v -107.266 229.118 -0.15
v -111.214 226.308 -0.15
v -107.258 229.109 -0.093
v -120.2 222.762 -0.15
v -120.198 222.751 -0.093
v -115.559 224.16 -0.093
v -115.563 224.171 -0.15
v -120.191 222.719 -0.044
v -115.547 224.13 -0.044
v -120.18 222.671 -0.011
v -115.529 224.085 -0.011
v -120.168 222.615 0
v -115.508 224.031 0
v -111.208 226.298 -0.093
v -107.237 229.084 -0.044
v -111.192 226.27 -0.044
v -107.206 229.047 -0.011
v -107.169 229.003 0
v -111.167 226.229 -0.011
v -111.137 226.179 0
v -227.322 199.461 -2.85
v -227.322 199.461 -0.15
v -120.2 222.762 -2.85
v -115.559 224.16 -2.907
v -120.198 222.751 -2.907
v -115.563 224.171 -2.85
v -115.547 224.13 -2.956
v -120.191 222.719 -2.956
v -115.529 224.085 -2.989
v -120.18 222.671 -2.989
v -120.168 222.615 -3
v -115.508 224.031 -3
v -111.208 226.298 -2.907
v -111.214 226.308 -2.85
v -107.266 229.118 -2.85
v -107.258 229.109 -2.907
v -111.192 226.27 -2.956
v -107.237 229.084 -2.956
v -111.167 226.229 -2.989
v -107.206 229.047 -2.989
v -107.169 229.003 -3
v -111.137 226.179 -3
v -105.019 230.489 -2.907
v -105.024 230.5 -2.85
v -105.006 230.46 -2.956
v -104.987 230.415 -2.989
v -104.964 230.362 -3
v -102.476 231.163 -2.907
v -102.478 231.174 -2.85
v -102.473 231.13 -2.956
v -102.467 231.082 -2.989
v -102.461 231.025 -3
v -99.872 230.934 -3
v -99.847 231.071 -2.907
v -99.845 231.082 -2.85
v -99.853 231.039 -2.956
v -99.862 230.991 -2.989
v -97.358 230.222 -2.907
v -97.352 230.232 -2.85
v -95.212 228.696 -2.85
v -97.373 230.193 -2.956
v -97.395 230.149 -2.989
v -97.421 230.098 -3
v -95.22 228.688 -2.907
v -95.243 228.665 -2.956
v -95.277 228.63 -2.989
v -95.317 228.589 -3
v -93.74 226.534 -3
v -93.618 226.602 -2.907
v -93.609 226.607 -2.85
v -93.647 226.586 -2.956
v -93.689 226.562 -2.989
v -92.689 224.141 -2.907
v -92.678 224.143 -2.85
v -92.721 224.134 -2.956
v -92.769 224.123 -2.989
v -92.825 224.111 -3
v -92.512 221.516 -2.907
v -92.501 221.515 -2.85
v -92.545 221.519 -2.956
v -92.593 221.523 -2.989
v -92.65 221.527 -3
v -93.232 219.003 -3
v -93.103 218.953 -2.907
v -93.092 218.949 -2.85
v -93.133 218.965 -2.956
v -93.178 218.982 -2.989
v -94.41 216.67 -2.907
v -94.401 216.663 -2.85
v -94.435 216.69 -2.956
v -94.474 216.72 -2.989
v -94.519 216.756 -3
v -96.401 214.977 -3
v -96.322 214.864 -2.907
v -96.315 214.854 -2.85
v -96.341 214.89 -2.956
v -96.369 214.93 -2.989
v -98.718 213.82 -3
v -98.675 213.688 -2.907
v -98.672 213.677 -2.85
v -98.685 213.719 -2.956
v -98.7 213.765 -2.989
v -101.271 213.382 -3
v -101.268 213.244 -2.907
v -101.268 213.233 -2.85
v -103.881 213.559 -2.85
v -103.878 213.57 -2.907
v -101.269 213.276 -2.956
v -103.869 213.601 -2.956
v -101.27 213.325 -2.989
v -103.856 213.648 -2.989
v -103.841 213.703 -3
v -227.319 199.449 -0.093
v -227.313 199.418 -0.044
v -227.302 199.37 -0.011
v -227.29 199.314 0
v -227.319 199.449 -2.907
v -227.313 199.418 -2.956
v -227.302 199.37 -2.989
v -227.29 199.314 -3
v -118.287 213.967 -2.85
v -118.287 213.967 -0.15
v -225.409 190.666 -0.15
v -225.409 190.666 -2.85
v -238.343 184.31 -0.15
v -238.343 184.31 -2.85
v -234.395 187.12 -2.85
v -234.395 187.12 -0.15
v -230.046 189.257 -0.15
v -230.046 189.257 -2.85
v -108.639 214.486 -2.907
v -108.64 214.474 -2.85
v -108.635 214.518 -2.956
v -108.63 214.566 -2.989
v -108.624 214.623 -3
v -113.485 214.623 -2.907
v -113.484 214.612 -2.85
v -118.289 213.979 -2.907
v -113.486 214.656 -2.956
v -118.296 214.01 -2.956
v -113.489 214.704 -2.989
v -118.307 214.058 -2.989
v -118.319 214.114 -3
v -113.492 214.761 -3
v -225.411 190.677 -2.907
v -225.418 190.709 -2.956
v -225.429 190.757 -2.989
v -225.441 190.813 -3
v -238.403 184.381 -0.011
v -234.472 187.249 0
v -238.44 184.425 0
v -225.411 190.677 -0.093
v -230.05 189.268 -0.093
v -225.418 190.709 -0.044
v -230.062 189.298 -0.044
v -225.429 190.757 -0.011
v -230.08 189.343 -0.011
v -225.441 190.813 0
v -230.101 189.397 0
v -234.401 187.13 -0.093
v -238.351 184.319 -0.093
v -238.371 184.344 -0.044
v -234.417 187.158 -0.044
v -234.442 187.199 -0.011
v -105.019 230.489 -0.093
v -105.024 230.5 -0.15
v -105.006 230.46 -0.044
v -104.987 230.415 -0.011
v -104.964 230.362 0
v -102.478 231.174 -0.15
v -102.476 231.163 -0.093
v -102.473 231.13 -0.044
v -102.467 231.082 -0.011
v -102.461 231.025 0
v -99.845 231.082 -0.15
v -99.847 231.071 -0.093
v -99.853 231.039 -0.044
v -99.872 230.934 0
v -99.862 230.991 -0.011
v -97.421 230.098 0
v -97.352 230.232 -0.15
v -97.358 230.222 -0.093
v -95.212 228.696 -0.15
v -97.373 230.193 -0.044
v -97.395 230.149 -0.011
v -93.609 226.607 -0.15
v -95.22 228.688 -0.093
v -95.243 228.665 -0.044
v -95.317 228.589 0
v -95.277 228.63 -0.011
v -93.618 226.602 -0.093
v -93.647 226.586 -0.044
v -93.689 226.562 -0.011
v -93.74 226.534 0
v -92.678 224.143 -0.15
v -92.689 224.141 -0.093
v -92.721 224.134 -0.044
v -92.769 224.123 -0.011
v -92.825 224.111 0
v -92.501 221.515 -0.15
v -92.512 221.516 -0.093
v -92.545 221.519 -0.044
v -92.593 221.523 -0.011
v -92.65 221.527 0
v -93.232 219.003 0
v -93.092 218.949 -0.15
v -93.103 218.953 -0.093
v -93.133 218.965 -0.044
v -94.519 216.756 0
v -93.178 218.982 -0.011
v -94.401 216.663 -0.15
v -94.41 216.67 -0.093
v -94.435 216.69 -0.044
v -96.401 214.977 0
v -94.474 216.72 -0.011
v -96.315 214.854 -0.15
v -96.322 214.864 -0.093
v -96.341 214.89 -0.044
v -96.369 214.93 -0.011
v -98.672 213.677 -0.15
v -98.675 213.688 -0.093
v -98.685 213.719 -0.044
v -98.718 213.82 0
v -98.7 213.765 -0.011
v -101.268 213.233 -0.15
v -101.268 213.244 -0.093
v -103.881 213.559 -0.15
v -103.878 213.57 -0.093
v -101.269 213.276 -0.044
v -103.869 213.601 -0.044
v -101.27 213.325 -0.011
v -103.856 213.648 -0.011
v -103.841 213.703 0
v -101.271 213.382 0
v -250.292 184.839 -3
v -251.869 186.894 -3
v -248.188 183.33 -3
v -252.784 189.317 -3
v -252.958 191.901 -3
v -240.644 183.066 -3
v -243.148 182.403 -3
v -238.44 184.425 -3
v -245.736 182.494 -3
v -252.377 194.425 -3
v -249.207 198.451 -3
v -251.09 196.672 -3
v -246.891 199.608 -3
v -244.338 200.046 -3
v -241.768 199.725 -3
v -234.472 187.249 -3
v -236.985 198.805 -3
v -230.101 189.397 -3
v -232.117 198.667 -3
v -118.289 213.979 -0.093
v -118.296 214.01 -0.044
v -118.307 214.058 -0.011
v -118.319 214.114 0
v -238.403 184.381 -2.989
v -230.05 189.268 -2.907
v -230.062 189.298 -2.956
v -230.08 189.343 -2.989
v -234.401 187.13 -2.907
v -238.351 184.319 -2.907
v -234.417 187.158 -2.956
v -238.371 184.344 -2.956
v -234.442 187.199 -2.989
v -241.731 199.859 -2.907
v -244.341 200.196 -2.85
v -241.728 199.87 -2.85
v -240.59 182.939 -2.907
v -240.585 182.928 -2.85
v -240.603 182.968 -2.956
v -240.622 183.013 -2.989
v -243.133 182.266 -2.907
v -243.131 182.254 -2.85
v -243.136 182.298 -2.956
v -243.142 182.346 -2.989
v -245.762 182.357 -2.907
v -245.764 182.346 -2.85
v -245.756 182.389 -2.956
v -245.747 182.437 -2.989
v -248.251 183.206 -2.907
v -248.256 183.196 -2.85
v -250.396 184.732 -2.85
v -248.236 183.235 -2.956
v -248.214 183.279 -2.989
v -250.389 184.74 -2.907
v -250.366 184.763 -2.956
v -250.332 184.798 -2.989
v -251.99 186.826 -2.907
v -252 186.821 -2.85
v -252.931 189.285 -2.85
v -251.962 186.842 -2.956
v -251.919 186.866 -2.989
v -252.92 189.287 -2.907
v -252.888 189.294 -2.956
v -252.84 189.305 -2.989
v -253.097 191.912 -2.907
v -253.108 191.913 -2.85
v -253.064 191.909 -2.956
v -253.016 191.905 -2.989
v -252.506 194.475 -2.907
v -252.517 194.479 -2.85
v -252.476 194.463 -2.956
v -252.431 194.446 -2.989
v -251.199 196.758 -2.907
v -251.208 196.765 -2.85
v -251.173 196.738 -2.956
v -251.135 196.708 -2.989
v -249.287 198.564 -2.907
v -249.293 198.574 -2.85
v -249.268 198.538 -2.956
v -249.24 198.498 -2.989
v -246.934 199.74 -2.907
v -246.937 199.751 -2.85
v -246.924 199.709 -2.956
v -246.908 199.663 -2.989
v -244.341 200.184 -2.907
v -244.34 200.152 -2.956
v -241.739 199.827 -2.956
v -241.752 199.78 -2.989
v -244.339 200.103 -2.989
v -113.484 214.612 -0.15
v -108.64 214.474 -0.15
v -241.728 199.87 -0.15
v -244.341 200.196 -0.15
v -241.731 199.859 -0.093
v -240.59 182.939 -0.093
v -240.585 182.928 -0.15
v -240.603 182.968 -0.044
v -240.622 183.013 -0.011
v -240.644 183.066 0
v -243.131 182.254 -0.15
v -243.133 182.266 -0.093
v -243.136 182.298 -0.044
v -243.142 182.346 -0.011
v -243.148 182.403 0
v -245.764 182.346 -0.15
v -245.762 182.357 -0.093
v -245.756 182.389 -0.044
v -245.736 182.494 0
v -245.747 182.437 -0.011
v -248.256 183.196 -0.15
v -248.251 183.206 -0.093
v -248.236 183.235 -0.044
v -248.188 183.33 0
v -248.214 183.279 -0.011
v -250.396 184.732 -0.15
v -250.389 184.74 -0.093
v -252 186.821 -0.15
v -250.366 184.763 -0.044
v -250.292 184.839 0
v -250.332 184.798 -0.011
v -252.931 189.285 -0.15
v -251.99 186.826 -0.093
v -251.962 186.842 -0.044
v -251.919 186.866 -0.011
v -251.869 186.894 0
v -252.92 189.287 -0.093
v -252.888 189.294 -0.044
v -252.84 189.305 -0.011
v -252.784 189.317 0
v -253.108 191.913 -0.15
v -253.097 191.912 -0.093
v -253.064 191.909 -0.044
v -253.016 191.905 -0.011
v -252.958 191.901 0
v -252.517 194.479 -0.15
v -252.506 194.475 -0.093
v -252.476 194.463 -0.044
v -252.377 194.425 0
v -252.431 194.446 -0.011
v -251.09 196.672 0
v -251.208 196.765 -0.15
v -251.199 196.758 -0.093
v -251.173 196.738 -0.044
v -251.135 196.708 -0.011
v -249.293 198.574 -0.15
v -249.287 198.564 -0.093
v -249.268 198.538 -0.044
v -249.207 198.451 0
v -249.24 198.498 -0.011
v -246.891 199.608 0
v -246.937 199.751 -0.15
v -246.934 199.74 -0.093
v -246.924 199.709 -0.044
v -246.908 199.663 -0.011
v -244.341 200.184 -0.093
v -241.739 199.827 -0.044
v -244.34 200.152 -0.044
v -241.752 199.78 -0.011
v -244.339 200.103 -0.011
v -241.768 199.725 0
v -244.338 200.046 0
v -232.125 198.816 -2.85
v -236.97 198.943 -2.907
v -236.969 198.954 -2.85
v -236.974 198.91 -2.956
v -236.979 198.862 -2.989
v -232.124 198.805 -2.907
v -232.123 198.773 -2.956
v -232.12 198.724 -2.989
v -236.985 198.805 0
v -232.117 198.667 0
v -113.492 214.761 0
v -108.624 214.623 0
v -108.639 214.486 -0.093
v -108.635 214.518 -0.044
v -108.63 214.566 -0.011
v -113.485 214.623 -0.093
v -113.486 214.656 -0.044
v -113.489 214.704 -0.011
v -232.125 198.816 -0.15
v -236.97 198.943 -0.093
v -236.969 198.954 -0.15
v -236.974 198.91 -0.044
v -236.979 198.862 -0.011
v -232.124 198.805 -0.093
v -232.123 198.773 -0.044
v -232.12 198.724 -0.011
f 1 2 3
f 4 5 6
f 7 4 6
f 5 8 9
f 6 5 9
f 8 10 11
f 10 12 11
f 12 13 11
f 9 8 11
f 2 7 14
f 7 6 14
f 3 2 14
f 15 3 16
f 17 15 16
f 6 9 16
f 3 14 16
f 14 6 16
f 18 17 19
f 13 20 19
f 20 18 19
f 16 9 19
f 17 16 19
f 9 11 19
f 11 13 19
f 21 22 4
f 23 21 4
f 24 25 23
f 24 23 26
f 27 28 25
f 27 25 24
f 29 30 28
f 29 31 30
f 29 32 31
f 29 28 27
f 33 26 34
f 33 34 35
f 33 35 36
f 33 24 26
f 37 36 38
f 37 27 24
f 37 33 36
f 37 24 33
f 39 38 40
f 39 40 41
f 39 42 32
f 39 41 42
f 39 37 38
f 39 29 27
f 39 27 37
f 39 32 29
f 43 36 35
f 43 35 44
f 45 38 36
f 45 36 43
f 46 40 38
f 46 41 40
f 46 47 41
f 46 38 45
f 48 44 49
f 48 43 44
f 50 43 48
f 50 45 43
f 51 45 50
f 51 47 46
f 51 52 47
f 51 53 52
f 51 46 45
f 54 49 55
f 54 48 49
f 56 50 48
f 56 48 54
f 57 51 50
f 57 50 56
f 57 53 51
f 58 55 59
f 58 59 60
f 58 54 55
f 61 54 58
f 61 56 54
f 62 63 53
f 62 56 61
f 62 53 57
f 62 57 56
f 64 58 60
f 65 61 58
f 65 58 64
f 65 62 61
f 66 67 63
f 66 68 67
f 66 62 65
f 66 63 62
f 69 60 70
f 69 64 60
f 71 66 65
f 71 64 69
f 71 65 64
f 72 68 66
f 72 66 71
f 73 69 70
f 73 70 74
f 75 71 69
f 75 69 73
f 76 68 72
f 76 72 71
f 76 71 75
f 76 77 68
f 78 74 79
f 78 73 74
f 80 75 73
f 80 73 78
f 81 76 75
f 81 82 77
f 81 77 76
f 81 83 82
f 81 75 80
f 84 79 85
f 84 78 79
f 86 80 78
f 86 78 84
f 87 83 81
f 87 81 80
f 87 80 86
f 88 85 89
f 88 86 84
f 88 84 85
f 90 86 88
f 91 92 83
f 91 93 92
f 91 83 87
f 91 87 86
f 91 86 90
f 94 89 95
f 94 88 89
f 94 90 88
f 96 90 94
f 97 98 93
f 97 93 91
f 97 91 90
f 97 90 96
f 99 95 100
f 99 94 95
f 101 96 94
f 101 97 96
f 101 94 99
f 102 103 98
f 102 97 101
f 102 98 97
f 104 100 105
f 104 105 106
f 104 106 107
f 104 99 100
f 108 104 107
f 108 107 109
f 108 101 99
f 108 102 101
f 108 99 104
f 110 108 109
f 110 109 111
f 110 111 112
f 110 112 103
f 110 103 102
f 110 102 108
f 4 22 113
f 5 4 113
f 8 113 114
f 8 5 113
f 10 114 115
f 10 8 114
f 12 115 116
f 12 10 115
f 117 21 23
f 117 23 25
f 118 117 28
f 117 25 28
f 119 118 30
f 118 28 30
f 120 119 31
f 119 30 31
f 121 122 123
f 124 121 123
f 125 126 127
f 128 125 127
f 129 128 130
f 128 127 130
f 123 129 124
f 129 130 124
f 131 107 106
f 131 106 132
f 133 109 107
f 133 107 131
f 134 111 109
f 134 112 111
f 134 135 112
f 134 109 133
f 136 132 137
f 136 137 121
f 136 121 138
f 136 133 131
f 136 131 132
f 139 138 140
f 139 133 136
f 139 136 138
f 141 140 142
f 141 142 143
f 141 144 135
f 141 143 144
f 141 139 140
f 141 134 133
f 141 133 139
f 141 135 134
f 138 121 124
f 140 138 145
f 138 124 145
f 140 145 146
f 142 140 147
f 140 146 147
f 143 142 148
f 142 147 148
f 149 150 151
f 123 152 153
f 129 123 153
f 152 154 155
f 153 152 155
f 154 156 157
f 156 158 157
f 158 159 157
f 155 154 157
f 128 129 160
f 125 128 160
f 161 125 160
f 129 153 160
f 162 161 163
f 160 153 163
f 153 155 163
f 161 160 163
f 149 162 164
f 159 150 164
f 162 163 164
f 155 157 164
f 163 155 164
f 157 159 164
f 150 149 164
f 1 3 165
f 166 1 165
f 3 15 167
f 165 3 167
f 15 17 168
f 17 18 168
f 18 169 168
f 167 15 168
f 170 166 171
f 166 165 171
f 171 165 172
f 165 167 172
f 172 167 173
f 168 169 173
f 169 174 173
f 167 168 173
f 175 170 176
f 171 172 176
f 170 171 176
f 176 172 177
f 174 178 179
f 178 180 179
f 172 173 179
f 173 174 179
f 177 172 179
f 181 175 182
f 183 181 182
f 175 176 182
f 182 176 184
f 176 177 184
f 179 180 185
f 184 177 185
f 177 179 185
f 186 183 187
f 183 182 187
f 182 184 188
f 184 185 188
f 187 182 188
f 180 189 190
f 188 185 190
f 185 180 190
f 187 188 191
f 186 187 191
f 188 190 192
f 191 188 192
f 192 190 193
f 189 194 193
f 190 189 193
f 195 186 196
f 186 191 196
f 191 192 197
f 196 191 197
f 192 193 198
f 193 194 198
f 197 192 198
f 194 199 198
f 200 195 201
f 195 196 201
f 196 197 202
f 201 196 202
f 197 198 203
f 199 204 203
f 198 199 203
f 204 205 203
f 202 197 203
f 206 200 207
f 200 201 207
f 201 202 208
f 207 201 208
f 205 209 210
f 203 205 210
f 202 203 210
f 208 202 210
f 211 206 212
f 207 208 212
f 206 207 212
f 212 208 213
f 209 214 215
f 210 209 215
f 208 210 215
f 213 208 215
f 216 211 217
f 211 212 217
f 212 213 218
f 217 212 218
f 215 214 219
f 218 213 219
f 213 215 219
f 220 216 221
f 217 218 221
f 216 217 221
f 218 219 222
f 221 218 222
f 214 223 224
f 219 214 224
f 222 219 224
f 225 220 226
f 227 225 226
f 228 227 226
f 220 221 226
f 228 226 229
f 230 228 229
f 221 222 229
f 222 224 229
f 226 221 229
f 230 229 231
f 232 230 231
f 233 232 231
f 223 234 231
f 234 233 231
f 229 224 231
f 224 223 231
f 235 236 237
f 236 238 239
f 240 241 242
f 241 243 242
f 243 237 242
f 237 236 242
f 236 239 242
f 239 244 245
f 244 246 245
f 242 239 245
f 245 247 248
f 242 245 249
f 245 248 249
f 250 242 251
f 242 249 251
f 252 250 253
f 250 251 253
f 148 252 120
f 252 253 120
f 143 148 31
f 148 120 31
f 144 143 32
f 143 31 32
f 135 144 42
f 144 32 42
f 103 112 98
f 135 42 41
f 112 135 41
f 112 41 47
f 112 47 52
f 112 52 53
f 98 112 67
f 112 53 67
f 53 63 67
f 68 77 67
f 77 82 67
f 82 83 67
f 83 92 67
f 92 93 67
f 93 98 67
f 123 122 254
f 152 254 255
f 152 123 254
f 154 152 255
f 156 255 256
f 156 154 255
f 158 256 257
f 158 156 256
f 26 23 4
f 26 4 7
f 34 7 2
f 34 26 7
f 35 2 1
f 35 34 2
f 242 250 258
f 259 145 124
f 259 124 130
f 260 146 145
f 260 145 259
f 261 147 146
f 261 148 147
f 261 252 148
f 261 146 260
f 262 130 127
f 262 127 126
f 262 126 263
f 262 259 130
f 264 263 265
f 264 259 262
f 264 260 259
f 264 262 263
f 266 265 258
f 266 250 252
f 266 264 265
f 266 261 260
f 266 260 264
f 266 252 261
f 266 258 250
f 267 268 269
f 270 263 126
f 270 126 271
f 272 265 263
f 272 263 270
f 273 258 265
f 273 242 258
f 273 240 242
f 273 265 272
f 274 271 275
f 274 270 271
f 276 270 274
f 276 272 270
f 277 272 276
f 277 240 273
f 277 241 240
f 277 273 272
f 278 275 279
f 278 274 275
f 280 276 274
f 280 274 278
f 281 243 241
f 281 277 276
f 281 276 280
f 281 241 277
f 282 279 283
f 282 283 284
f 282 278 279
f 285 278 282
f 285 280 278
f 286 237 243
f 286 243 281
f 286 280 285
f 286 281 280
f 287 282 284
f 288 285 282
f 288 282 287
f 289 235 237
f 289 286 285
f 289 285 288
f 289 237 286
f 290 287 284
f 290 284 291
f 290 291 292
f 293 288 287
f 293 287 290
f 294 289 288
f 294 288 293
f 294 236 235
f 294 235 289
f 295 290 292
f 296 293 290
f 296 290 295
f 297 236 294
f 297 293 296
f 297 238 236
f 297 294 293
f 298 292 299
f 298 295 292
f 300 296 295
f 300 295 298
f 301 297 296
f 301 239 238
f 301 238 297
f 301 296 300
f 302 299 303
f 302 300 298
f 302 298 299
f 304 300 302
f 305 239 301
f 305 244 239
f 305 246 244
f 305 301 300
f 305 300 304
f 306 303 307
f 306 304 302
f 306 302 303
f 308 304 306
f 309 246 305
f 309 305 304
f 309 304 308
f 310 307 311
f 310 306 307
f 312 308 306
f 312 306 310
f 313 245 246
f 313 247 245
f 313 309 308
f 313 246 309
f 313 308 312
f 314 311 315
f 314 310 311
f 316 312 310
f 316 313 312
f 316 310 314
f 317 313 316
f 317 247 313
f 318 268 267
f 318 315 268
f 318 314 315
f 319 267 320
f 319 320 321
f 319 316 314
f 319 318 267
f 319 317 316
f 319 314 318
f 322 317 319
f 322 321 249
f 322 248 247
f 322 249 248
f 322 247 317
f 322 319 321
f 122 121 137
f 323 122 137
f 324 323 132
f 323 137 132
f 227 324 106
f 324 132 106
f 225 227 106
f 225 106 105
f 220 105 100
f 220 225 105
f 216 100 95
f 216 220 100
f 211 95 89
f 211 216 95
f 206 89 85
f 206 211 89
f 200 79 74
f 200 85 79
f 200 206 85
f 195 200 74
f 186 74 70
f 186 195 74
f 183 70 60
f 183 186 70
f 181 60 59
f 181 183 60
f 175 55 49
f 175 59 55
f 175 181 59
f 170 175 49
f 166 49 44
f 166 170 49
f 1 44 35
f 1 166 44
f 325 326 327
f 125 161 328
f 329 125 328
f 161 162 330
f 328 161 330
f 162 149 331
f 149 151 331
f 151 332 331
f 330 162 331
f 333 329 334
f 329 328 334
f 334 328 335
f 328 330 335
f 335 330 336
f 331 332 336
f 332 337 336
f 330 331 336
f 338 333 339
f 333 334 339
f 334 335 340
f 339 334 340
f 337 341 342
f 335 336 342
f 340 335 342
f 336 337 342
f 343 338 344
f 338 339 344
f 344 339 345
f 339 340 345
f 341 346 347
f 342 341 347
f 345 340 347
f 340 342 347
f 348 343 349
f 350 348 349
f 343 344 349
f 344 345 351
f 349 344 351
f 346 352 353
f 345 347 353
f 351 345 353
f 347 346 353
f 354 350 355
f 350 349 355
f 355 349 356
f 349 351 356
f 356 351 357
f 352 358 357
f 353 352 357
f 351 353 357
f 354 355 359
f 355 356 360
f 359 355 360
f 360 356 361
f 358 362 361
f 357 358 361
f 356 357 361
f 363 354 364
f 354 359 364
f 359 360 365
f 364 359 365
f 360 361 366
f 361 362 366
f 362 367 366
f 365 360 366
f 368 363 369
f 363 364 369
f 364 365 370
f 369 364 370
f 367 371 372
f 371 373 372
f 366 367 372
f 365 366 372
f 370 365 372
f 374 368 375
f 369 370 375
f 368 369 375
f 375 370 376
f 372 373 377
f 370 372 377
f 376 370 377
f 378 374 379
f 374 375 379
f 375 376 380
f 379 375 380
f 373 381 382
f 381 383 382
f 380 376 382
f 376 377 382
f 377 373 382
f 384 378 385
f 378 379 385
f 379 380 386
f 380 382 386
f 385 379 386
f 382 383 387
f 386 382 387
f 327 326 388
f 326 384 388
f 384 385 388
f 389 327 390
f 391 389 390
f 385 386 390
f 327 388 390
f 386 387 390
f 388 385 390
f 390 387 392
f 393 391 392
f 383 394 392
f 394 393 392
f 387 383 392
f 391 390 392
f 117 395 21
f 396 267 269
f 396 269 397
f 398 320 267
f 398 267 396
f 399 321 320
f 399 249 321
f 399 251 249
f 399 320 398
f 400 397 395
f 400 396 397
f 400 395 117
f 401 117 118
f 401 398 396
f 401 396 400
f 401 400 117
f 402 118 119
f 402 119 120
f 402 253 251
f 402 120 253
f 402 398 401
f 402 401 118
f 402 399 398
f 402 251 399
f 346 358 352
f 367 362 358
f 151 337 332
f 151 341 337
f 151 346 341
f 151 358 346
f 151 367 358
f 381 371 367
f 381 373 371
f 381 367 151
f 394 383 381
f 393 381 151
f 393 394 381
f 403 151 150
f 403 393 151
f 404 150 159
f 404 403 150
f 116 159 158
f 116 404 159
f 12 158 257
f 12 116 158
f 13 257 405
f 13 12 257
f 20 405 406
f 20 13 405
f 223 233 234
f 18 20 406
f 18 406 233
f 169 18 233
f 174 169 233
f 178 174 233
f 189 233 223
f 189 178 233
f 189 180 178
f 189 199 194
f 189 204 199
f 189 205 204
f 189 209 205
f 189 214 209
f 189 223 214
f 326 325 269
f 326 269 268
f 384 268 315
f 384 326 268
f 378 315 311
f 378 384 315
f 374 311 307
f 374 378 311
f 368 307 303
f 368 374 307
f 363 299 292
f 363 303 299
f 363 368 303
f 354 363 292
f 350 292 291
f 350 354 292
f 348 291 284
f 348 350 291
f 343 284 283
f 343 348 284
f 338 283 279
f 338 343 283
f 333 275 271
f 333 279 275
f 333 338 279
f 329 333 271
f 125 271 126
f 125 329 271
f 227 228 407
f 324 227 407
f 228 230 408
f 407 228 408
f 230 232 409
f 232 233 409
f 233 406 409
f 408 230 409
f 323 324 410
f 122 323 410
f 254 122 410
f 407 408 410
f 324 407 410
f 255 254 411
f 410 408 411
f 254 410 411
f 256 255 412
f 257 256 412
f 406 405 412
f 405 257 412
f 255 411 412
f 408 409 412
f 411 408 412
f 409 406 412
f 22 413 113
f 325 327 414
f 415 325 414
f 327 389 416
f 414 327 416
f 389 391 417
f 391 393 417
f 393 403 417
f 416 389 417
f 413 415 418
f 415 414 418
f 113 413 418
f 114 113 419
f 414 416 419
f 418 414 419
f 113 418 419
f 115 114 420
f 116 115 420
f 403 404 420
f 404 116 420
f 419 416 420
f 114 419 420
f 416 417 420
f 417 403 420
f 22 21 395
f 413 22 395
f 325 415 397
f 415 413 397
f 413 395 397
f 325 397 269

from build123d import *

# Parameters (mm, degrees)
SKETCH_1_R      = 9
EXTRUDE_1_DEPTH = 3
FILLET_1_R      = 30
FILLET_2_R      = 0.15


with BuildPart() as part:
    # 草图1 → 凸台-拉伸1 (new body)
    with BuildSketch(Plane.XY):
        with Locations((-244.136401891, 191.197879466)):
            Circle(SKETCH_1_R)
        with Locations((-101.472478495, 222.230200701)):
            Circle(SKETCH_1_R)
        with BuildLine():
            Line((-100.516002841, 217.833024979), (-243.179926237, 186.800703745))
            ThreePointArc((-243.179926237, 186.800703745), (-248.533577612, 190.241403811), (-245.092877546, 195.595055187))
            Line((-245.092877546, 195.595055187), (-102.42895415, 226.627376422))
            ThreePointArc((-102.42895415, 226.627376422), (-97.075302774, 223.186676355), (-100.516002841, 217.833024979))
        make_face()
    extrude(amount=-EXTRUDE_1_DEPTH)

    # 圆角1
    fillet_1_edges = [part.edges().sort_by_distance(p)[0] for p in [
        (-108.132134599, 216.17636055, -1.5),
        (-235.563794478, 188.457368174, -1.5),
        (-237.476745787, 197.251719617, -1.5),
        (-110.045085908, 224.970711992, -1.5),
    ]]
    fillet(fillet_1_edges, radius=FILLET_1_R)

    # 圆角2
    fillet_2_edges = [part.edges().sort_by_distance(p)[0] for p in [
        (-173.760915848, 211.111215804, 0),
        (-173.760915848, 211.111215804, -3),
        (-252.930753333, 189.284928157, 0),
        (-252.930753333, 189.284928157, -3),
        (-171.847964539, 202.316864362, 0),
        (-171.847964539, 202.316864362, -3),
        (-92.678127053, 224.14315201, 0),
        (-92.678127053, 224.14315201, -3),
        (-234.549689719, 198.787190778, 0),
        (-234.549689719, 198.787190778, -3),
        (-232.263398459, 188.276495212, 0),
        (-232.263398459, 188.276495212, -3),
        (-111.059190667, 214.640889389, 0),
        (-111.059190667, 214.640889389, -3),
        (-113.345481927, 225.151584954, 0),
        (-113.345481927, 225.151584954, -3),
    ]]
    fillet(fillet_2_edges, radius=FILLET_2_R)


solid = part.part
